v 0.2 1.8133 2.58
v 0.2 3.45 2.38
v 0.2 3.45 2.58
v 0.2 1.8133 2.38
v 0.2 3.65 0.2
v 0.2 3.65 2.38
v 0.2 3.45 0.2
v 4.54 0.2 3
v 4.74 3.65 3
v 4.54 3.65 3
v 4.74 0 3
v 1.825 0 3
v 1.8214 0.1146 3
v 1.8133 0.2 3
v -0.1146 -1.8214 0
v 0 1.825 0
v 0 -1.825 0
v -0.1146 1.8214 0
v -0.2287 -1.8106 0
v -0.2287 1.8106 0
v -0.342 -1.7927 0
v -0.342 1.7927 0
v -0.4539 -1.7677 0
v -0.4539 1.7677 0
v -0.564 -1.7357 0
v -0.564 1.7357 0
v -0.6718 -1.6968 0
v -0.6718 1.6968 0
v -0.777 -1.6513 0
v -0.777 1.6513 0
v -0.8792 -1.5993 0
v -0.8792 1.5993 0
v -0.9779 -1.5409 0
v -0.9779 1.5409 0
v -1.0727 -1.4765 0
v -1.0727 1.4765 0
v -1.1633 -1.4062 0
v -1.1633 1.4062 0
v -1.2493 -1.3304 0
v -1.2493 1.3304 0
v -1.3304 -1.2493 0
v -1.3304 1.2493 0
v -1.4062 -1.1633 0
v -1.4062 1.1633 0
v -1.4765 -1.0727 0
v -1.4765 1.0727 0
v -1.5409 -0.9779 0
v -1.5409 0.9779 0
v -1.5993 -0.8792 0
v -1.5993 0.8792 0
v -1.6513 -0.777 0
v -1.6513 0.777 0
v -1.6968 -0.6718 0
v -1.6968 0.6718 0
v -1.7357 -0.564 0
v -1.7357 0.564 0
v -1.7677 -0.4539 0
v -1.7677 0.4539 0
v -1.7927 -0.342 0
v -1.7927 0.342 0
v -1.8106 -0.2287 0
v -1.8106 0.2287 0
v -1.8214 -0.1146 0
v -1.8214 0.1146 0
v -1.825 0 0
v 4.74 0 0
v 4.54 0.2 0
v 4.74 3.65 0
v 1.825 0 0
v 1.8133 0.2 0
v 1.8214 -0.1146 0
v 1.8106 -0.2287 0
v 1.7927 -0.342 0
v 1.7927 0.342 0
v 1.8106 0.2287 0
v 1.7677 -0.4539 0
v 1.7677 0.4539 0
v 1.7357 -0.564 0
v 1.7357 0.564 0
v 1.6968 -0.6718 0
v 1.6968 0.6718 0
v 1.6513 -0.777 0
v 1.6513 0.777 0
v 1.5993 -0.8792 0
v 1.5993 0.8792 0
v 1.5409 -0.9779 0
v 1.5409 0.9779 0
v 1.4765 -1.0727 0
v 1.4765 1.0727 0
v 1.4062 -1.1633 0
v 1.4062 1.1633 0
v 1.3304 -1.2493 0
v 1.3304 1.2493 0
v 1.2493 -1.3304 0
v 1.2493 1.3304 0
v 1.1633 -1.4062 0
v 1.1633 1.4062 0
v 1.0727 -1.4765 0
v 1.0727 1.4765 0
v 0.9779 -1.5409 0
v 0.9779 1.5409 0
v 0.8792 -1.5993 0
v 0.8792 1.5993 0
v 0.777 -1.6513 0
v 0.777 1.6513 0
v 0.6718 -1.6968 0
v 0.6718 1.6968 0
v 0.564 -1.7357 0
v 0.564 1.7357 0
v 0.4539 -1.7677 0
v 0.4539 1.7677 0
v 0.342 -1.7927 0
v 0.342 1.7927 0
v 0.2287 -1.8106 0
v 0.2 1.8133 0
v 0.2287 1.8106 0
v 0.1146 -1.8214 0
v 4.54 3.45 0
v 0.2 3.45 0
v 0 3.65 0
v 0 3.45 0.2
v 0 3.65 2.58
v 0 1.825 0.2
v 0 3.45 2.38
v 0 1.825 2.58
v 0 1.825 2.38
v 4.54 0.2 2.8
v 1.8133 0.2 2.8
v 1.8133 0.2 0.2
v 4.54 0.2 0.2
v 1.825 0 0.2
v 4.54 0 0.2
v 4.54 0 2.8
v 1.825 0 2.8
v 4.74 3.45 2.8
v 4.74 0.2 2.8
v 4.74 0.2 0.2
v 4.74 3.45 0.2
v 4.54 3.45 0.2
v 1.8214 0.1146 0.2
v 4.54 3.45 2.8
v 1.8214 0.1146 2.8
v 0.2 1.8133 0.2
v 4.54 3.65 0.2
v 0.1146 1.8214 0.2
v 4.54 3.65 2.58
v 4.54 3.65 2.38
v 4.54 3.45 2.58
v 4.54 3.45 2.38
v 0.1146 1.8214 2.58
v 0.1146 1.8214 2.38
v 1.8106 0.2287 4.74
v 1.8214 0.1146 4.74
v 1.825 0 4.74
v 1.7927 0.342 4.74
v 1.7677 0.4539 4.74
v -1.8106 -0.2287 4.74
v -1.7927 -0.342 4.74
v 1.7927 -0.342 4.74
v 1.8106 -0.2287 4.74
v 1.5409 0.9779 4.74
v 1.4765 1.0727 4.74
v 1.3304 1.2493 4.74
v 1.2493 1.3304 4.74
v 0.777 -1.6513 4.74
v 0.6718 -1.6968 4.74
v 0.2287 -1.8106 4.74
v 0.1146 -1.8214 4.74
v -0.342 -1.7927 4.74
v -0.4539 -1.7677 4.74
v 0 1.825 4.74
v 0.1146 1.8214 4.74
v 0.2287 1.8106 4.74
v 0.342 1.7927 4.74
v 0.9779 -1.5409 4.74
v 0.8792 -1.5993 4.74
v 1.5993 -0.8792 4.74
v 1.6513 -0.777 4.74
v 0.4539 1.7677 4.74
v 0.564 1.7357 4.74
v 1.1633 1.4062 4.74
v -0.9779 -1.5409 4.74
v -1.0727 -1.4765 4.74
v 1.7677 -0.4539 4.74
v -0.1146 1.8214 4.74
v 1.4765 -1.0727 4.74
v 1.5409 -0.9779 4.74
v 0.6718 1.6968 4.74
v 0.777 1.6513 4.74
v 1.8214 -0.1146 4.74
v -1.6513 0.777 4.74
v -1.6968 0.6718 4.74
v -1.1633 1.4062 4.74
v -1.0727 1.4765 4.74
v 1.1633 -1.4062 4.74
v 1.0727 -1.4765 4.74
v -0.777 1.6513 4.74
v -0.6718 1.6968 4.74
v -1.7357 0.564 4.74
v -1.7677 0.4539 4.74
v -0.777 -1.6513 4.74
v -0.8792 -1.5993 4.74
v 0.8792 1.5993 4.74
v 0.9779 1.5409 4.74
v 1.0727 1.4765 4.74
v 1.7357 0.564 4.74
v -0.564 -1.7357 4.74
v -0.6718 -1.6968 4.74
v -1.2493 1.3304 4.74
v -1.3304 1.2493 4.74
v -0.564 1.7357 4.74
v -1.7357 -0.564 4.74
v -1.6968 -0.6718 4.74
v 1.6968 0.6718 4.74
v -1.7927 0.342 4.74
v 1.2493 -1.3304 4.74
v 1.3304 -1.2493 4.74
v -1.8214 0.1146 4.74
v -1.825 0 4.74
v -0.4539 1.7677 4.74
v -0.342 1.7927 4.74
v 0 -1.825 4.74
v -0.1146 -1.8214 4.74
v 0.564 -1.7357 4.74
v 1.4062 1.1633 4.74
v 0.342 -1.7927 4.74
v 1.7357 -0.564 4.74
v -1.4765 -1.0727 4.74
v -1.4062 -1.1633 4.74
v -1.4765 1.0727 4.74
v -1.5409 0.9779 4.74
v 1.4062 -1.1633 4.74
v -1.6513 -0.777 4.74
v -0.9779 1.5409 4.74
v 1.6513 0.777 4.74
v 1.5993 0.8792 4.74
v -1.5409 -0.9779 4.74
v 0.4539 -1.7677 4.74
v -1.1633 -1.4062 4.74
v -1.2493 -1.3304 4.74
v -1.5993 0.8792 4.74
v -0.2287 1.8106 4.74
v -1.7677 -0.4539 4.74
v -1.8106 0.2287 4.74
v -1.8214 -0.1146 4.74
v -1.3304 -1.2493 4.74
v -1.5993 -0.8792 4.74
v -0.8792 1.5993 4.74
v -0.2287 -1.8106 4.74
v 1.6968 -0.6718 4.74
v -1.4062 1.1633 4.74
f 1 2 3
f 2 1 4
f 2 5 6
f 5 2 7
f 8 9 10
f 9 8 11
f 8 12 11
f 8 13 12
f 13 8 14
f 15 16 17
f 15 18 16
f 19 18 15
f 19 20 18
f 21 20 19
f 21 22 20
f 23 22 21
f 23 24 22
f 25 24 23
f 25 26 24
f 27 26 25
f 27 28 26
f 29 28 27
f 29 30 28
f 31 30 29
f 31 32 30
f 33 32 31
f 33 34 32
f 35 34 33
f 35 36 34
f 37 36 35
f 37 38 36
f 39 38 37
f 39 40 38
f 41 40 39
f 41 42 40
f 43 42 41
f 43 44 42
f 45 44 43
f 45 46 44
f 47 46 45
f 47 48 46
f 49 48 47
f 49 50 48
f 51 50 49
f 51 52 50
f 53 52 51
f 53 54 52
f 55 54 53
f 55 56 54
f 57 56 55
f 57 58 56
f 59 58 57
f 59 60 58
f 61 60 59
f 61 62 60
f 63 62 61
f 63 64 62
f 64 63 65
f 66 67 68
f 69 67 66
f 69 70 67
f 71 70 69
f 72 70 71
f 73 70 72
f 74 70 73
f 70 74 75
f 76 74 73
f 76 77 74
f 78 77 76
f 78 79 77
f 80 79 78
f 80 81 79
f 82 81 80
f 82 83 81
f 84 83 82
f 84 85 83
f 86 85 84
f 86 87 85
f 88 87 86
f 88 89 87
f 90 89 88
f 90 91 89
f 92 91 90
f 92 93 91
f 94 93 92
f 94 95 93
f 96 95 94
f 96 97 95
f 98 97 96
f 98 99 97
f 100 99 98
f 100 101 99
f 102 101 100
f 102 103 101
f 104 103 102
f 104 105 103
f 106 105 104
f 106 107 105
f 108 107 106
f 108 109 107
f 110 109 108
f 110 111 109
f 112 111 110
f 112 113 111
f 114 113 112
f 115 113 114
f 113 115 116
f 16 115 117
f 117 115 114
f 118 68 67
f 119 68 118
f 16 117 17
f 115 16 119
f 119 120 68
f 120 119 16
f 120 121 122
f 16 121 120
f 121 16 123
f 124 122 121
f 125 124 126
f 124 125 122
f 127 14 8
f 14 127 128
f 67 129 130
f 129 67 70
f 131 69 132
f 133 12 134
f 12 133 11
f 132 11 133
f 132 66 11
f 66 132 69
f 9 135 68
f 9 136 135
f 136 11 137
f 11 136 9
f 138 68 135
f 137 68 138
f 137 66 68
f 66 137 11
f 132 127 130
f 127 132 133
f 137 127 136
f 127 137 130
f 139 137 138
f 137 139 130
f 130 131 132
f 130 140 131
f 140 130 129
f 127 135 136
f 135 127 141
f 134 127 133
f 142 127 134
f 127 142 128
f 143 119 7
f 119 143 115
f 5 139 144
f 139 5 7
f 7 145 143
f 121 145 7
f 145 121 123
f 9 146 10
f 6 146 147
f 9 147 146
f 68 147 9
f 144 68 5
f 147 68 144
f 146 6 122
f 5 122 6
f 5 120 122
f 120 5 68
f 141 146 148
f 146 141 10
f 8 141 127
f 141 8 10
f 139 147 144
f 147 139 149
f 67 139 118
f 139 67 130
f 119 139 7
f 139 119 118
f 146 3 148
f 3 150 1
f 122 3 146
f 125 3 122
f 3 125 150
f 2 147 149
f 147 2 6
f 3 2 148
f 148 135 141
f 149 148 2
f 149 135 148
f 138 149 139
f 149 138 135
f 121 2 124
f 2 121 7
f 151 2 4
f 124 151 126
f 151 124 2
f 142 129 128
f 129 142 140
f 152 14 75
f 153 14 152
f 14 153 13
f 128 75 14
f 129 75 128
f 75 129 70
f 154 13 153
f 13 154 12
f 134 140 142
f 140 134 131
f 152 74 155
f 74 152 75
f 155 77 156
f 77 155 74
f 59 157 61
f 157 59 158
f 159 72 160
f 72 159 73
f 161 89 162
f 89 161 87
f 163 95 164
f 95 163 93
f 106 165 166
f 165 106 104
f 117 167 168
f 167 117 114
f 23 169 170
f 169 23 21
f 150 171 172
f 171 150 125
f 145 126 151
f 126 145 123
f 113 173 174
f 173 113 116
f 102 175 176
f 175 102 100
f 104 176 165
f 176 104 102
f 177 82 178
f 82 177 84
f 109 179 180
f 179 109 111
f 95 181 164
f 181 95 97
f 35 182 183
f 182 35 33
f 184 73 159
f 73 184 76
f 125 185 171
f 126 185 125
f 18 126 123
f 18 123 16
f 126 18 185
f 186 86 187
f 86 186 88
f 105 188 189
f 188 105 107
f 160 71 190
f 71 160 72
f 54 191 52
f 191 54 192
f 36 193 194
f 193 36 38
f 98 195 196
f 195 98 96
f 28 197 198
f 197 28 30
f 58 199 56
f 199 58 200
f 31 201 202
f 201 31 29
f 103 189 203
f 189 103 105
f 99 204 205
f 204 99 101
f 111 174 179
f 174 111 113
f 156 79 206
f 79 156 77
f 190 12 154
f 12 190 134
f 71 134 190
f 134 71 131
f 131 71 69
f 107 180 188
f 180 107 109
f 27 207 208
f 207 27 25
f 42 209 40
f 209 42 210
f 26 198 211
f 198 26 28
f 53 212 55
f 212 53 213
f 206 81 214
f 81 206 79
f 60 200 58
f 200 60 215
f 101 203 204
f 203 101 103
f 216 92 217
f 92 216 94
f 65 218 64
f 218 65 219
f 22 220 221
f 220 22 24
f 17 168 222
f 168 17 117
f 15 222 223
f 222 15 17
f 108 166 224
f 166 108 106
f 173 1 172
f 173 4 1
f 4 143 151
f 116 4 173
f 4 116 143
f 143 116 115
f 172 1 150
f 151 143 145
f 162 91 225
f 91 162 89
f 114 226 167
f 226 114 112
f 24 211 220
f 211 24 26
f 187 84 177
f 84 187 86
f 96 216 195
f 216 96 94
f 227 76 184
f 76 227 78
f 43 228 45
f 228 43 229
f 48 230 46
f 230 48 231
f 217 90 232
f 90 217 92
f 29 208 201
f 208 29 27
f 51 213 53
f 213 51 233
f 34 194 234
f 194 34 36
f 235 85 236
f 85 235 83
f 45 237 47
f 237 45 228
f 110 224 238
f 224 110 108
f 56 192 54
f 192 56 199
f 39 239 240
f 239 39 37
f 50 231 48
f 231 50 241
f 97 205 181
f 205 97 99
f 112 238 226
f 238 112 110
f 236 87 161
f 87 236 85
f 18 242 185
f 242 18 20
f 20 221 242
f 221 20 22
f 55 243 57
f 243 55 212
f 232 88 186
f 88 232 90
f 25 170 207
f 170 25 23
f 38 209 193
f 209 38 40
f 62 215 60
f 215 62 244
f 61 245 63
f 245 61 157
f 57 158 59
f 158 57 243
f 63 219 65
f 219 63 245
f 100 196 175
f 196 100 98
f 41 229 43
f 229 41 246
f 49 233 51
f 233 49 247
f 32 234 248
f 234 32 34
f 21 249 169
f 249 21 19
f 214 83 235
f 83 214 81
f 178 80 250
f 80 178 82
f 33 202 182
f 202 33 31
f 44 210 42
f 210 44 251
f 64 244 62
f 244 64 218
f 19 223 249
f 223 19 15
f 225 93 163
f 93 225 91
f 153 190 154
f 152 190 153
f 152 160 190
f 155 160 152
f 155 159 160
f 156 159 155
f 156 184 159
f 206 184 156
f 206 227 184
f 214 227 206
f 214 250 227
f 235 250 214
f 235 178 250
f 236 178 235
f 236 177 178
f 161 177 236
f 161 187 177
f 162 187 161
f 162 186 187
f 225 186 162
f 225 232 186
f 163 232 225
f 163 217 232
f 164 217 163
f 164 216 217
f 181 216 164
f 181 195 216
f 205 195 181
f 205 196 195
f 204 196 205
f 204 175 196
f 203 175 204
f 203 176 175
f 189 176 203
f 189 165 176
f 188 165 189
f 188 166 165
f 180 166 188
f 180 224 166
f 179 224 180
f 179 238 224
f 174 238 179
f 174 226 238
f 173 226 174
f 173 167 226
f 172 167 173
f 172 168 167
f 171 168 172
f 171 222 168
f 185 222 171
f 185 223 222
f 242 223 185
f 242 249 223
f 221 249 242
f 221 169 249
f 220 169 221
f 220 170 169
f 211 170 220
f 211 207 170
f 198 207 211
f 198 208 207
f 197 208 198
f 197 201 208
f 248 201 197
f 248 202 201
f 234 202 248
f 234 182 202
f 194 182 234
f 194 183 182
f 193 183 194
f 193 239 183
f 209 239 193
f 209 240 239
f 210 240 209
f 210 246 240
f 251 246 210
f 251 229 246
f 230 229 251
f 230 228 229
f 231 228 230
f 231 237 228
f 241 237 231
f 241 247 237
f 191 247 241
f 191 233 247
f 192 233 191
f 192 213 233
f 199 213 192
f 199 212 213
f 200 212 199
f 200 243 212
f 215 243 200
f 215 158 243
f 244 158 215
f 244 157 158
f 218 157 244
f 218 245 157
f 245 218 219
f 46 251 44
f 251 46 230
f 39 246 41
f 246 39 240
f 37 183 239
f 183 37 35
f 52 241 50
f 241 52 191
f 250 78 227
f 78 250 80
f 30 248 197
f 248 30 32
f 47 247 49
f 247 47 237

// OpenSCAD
hmax=3;
dif=0.42;
hmin=hmax-dif;
grosor=0.2;
ancho_interno=3.25;
largo_interno=4.34;
ancho_total=ancho_interno+2*grosor;
largo_total=largo_interno+2*grosor;
module columna(){
    cube([grosor,grosor,hmax]);
}

module viga_largo(){
    color("orange")
    cube([largo_interno+2*grosor,grosor,grosor]);
}

module columna_menor(){
    color("green")
    cube([grosor,grosor,hmin]);
}
module viga_ancho(){
    color("orange")
    cube([grosor,ancho_interno+2*grosor,grosor]);
}

color("red")
columna();

color("yellow")
translate([largo_interno+grosor,0,0])
columna();

color("pink")
viga_largo();

color("gray")
translate([0,0,hmax-grosor])
viga_largo();

color("skyblue")
viga_ancho();

color("lightgreen")
translate([largo_interno+grosor,0,0])
viga_ancho();

color("orange")
translate([largo_interno+grosor,0,hmax-grosor])
viga_ancho();

color("black")
translate([0,ancho_interno+grosor,0])
viga_largo();

color("purple")
translate([0,ancho_interno+grosor,hmin-grosor])
viga_largo();

//Columna esquina
color("brown")
translate([largo_interno+grosor,ancho_interno+grosor,0])
columna();

color("green")
translate([0,ancho_interno+grosor,0])
columna_menor();

//Vigas baja altura
color("blue")
translate([0,0,hmin-grosor])
viga_ancho();


//techo

//translate([0,ancho_total/2,hmax])
//rotate([0,90,0])
cylinder(largo_total,d=ancho_total,$fn=100);

//cubo()
//cylinder(
